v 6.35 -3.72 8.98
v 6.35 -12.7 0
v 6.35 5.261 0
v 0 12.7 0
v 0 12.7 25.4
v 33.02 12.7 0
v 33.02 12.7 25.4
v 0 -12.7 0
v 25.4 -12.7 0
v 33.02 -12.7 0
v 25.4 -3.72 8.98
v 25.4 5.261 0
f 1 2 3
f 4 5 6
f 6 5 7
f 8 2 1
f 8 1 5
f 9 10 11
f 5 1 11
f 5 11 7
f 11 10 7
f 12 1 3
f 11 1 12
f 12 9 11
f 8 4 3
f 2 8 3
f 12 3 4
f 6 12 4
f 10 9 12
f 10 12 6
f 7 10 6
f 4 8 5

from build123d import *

# Parameters (mm, degrees)
F0_W     = 33.02
F0_H     = 25.4
F1_DEPTH = 12.7
F3_DEPTH = 33.021
F4_W     = 19.05
F4_H     = 12.7
F5_DEPTH = 12.7


with BuildPart() as f1:
    # F0 (on Front) → F1 (new body, symmetric)
    with BuildSketch(Plane.XZ):
        with Locations((16.51, 12.7)):
            Rectangle(F0_W, F0_H)
    extrude(amount=F1_DEPTH, both=True)

    # F2 (on face) → F3 (cut, through all)
    with BuildSketch(Plane.YZ.offset(33.02)):
        Polygon((-12.7, 0), (12.7, 25.4), (-12.7, 25.4), align=None)
    extrude(amount=-F3_DEPTH, mode=Mode.SUBTRACT)

    # F4 (on face) → F5 (cut)
    with BuildSketch(Plane(origin=(0, -6.35, 6.35), x_dir=(1, 0, 0), z_dir=(0, -0.707107, 0.707107))):
        with Locations((15.875, -2.630256)):
            Rectangle(F4_W, F4_H)
    extrude(amount=-F5_DEPTH, mode=Mode.SUBTRACT)


solid = f1.part
